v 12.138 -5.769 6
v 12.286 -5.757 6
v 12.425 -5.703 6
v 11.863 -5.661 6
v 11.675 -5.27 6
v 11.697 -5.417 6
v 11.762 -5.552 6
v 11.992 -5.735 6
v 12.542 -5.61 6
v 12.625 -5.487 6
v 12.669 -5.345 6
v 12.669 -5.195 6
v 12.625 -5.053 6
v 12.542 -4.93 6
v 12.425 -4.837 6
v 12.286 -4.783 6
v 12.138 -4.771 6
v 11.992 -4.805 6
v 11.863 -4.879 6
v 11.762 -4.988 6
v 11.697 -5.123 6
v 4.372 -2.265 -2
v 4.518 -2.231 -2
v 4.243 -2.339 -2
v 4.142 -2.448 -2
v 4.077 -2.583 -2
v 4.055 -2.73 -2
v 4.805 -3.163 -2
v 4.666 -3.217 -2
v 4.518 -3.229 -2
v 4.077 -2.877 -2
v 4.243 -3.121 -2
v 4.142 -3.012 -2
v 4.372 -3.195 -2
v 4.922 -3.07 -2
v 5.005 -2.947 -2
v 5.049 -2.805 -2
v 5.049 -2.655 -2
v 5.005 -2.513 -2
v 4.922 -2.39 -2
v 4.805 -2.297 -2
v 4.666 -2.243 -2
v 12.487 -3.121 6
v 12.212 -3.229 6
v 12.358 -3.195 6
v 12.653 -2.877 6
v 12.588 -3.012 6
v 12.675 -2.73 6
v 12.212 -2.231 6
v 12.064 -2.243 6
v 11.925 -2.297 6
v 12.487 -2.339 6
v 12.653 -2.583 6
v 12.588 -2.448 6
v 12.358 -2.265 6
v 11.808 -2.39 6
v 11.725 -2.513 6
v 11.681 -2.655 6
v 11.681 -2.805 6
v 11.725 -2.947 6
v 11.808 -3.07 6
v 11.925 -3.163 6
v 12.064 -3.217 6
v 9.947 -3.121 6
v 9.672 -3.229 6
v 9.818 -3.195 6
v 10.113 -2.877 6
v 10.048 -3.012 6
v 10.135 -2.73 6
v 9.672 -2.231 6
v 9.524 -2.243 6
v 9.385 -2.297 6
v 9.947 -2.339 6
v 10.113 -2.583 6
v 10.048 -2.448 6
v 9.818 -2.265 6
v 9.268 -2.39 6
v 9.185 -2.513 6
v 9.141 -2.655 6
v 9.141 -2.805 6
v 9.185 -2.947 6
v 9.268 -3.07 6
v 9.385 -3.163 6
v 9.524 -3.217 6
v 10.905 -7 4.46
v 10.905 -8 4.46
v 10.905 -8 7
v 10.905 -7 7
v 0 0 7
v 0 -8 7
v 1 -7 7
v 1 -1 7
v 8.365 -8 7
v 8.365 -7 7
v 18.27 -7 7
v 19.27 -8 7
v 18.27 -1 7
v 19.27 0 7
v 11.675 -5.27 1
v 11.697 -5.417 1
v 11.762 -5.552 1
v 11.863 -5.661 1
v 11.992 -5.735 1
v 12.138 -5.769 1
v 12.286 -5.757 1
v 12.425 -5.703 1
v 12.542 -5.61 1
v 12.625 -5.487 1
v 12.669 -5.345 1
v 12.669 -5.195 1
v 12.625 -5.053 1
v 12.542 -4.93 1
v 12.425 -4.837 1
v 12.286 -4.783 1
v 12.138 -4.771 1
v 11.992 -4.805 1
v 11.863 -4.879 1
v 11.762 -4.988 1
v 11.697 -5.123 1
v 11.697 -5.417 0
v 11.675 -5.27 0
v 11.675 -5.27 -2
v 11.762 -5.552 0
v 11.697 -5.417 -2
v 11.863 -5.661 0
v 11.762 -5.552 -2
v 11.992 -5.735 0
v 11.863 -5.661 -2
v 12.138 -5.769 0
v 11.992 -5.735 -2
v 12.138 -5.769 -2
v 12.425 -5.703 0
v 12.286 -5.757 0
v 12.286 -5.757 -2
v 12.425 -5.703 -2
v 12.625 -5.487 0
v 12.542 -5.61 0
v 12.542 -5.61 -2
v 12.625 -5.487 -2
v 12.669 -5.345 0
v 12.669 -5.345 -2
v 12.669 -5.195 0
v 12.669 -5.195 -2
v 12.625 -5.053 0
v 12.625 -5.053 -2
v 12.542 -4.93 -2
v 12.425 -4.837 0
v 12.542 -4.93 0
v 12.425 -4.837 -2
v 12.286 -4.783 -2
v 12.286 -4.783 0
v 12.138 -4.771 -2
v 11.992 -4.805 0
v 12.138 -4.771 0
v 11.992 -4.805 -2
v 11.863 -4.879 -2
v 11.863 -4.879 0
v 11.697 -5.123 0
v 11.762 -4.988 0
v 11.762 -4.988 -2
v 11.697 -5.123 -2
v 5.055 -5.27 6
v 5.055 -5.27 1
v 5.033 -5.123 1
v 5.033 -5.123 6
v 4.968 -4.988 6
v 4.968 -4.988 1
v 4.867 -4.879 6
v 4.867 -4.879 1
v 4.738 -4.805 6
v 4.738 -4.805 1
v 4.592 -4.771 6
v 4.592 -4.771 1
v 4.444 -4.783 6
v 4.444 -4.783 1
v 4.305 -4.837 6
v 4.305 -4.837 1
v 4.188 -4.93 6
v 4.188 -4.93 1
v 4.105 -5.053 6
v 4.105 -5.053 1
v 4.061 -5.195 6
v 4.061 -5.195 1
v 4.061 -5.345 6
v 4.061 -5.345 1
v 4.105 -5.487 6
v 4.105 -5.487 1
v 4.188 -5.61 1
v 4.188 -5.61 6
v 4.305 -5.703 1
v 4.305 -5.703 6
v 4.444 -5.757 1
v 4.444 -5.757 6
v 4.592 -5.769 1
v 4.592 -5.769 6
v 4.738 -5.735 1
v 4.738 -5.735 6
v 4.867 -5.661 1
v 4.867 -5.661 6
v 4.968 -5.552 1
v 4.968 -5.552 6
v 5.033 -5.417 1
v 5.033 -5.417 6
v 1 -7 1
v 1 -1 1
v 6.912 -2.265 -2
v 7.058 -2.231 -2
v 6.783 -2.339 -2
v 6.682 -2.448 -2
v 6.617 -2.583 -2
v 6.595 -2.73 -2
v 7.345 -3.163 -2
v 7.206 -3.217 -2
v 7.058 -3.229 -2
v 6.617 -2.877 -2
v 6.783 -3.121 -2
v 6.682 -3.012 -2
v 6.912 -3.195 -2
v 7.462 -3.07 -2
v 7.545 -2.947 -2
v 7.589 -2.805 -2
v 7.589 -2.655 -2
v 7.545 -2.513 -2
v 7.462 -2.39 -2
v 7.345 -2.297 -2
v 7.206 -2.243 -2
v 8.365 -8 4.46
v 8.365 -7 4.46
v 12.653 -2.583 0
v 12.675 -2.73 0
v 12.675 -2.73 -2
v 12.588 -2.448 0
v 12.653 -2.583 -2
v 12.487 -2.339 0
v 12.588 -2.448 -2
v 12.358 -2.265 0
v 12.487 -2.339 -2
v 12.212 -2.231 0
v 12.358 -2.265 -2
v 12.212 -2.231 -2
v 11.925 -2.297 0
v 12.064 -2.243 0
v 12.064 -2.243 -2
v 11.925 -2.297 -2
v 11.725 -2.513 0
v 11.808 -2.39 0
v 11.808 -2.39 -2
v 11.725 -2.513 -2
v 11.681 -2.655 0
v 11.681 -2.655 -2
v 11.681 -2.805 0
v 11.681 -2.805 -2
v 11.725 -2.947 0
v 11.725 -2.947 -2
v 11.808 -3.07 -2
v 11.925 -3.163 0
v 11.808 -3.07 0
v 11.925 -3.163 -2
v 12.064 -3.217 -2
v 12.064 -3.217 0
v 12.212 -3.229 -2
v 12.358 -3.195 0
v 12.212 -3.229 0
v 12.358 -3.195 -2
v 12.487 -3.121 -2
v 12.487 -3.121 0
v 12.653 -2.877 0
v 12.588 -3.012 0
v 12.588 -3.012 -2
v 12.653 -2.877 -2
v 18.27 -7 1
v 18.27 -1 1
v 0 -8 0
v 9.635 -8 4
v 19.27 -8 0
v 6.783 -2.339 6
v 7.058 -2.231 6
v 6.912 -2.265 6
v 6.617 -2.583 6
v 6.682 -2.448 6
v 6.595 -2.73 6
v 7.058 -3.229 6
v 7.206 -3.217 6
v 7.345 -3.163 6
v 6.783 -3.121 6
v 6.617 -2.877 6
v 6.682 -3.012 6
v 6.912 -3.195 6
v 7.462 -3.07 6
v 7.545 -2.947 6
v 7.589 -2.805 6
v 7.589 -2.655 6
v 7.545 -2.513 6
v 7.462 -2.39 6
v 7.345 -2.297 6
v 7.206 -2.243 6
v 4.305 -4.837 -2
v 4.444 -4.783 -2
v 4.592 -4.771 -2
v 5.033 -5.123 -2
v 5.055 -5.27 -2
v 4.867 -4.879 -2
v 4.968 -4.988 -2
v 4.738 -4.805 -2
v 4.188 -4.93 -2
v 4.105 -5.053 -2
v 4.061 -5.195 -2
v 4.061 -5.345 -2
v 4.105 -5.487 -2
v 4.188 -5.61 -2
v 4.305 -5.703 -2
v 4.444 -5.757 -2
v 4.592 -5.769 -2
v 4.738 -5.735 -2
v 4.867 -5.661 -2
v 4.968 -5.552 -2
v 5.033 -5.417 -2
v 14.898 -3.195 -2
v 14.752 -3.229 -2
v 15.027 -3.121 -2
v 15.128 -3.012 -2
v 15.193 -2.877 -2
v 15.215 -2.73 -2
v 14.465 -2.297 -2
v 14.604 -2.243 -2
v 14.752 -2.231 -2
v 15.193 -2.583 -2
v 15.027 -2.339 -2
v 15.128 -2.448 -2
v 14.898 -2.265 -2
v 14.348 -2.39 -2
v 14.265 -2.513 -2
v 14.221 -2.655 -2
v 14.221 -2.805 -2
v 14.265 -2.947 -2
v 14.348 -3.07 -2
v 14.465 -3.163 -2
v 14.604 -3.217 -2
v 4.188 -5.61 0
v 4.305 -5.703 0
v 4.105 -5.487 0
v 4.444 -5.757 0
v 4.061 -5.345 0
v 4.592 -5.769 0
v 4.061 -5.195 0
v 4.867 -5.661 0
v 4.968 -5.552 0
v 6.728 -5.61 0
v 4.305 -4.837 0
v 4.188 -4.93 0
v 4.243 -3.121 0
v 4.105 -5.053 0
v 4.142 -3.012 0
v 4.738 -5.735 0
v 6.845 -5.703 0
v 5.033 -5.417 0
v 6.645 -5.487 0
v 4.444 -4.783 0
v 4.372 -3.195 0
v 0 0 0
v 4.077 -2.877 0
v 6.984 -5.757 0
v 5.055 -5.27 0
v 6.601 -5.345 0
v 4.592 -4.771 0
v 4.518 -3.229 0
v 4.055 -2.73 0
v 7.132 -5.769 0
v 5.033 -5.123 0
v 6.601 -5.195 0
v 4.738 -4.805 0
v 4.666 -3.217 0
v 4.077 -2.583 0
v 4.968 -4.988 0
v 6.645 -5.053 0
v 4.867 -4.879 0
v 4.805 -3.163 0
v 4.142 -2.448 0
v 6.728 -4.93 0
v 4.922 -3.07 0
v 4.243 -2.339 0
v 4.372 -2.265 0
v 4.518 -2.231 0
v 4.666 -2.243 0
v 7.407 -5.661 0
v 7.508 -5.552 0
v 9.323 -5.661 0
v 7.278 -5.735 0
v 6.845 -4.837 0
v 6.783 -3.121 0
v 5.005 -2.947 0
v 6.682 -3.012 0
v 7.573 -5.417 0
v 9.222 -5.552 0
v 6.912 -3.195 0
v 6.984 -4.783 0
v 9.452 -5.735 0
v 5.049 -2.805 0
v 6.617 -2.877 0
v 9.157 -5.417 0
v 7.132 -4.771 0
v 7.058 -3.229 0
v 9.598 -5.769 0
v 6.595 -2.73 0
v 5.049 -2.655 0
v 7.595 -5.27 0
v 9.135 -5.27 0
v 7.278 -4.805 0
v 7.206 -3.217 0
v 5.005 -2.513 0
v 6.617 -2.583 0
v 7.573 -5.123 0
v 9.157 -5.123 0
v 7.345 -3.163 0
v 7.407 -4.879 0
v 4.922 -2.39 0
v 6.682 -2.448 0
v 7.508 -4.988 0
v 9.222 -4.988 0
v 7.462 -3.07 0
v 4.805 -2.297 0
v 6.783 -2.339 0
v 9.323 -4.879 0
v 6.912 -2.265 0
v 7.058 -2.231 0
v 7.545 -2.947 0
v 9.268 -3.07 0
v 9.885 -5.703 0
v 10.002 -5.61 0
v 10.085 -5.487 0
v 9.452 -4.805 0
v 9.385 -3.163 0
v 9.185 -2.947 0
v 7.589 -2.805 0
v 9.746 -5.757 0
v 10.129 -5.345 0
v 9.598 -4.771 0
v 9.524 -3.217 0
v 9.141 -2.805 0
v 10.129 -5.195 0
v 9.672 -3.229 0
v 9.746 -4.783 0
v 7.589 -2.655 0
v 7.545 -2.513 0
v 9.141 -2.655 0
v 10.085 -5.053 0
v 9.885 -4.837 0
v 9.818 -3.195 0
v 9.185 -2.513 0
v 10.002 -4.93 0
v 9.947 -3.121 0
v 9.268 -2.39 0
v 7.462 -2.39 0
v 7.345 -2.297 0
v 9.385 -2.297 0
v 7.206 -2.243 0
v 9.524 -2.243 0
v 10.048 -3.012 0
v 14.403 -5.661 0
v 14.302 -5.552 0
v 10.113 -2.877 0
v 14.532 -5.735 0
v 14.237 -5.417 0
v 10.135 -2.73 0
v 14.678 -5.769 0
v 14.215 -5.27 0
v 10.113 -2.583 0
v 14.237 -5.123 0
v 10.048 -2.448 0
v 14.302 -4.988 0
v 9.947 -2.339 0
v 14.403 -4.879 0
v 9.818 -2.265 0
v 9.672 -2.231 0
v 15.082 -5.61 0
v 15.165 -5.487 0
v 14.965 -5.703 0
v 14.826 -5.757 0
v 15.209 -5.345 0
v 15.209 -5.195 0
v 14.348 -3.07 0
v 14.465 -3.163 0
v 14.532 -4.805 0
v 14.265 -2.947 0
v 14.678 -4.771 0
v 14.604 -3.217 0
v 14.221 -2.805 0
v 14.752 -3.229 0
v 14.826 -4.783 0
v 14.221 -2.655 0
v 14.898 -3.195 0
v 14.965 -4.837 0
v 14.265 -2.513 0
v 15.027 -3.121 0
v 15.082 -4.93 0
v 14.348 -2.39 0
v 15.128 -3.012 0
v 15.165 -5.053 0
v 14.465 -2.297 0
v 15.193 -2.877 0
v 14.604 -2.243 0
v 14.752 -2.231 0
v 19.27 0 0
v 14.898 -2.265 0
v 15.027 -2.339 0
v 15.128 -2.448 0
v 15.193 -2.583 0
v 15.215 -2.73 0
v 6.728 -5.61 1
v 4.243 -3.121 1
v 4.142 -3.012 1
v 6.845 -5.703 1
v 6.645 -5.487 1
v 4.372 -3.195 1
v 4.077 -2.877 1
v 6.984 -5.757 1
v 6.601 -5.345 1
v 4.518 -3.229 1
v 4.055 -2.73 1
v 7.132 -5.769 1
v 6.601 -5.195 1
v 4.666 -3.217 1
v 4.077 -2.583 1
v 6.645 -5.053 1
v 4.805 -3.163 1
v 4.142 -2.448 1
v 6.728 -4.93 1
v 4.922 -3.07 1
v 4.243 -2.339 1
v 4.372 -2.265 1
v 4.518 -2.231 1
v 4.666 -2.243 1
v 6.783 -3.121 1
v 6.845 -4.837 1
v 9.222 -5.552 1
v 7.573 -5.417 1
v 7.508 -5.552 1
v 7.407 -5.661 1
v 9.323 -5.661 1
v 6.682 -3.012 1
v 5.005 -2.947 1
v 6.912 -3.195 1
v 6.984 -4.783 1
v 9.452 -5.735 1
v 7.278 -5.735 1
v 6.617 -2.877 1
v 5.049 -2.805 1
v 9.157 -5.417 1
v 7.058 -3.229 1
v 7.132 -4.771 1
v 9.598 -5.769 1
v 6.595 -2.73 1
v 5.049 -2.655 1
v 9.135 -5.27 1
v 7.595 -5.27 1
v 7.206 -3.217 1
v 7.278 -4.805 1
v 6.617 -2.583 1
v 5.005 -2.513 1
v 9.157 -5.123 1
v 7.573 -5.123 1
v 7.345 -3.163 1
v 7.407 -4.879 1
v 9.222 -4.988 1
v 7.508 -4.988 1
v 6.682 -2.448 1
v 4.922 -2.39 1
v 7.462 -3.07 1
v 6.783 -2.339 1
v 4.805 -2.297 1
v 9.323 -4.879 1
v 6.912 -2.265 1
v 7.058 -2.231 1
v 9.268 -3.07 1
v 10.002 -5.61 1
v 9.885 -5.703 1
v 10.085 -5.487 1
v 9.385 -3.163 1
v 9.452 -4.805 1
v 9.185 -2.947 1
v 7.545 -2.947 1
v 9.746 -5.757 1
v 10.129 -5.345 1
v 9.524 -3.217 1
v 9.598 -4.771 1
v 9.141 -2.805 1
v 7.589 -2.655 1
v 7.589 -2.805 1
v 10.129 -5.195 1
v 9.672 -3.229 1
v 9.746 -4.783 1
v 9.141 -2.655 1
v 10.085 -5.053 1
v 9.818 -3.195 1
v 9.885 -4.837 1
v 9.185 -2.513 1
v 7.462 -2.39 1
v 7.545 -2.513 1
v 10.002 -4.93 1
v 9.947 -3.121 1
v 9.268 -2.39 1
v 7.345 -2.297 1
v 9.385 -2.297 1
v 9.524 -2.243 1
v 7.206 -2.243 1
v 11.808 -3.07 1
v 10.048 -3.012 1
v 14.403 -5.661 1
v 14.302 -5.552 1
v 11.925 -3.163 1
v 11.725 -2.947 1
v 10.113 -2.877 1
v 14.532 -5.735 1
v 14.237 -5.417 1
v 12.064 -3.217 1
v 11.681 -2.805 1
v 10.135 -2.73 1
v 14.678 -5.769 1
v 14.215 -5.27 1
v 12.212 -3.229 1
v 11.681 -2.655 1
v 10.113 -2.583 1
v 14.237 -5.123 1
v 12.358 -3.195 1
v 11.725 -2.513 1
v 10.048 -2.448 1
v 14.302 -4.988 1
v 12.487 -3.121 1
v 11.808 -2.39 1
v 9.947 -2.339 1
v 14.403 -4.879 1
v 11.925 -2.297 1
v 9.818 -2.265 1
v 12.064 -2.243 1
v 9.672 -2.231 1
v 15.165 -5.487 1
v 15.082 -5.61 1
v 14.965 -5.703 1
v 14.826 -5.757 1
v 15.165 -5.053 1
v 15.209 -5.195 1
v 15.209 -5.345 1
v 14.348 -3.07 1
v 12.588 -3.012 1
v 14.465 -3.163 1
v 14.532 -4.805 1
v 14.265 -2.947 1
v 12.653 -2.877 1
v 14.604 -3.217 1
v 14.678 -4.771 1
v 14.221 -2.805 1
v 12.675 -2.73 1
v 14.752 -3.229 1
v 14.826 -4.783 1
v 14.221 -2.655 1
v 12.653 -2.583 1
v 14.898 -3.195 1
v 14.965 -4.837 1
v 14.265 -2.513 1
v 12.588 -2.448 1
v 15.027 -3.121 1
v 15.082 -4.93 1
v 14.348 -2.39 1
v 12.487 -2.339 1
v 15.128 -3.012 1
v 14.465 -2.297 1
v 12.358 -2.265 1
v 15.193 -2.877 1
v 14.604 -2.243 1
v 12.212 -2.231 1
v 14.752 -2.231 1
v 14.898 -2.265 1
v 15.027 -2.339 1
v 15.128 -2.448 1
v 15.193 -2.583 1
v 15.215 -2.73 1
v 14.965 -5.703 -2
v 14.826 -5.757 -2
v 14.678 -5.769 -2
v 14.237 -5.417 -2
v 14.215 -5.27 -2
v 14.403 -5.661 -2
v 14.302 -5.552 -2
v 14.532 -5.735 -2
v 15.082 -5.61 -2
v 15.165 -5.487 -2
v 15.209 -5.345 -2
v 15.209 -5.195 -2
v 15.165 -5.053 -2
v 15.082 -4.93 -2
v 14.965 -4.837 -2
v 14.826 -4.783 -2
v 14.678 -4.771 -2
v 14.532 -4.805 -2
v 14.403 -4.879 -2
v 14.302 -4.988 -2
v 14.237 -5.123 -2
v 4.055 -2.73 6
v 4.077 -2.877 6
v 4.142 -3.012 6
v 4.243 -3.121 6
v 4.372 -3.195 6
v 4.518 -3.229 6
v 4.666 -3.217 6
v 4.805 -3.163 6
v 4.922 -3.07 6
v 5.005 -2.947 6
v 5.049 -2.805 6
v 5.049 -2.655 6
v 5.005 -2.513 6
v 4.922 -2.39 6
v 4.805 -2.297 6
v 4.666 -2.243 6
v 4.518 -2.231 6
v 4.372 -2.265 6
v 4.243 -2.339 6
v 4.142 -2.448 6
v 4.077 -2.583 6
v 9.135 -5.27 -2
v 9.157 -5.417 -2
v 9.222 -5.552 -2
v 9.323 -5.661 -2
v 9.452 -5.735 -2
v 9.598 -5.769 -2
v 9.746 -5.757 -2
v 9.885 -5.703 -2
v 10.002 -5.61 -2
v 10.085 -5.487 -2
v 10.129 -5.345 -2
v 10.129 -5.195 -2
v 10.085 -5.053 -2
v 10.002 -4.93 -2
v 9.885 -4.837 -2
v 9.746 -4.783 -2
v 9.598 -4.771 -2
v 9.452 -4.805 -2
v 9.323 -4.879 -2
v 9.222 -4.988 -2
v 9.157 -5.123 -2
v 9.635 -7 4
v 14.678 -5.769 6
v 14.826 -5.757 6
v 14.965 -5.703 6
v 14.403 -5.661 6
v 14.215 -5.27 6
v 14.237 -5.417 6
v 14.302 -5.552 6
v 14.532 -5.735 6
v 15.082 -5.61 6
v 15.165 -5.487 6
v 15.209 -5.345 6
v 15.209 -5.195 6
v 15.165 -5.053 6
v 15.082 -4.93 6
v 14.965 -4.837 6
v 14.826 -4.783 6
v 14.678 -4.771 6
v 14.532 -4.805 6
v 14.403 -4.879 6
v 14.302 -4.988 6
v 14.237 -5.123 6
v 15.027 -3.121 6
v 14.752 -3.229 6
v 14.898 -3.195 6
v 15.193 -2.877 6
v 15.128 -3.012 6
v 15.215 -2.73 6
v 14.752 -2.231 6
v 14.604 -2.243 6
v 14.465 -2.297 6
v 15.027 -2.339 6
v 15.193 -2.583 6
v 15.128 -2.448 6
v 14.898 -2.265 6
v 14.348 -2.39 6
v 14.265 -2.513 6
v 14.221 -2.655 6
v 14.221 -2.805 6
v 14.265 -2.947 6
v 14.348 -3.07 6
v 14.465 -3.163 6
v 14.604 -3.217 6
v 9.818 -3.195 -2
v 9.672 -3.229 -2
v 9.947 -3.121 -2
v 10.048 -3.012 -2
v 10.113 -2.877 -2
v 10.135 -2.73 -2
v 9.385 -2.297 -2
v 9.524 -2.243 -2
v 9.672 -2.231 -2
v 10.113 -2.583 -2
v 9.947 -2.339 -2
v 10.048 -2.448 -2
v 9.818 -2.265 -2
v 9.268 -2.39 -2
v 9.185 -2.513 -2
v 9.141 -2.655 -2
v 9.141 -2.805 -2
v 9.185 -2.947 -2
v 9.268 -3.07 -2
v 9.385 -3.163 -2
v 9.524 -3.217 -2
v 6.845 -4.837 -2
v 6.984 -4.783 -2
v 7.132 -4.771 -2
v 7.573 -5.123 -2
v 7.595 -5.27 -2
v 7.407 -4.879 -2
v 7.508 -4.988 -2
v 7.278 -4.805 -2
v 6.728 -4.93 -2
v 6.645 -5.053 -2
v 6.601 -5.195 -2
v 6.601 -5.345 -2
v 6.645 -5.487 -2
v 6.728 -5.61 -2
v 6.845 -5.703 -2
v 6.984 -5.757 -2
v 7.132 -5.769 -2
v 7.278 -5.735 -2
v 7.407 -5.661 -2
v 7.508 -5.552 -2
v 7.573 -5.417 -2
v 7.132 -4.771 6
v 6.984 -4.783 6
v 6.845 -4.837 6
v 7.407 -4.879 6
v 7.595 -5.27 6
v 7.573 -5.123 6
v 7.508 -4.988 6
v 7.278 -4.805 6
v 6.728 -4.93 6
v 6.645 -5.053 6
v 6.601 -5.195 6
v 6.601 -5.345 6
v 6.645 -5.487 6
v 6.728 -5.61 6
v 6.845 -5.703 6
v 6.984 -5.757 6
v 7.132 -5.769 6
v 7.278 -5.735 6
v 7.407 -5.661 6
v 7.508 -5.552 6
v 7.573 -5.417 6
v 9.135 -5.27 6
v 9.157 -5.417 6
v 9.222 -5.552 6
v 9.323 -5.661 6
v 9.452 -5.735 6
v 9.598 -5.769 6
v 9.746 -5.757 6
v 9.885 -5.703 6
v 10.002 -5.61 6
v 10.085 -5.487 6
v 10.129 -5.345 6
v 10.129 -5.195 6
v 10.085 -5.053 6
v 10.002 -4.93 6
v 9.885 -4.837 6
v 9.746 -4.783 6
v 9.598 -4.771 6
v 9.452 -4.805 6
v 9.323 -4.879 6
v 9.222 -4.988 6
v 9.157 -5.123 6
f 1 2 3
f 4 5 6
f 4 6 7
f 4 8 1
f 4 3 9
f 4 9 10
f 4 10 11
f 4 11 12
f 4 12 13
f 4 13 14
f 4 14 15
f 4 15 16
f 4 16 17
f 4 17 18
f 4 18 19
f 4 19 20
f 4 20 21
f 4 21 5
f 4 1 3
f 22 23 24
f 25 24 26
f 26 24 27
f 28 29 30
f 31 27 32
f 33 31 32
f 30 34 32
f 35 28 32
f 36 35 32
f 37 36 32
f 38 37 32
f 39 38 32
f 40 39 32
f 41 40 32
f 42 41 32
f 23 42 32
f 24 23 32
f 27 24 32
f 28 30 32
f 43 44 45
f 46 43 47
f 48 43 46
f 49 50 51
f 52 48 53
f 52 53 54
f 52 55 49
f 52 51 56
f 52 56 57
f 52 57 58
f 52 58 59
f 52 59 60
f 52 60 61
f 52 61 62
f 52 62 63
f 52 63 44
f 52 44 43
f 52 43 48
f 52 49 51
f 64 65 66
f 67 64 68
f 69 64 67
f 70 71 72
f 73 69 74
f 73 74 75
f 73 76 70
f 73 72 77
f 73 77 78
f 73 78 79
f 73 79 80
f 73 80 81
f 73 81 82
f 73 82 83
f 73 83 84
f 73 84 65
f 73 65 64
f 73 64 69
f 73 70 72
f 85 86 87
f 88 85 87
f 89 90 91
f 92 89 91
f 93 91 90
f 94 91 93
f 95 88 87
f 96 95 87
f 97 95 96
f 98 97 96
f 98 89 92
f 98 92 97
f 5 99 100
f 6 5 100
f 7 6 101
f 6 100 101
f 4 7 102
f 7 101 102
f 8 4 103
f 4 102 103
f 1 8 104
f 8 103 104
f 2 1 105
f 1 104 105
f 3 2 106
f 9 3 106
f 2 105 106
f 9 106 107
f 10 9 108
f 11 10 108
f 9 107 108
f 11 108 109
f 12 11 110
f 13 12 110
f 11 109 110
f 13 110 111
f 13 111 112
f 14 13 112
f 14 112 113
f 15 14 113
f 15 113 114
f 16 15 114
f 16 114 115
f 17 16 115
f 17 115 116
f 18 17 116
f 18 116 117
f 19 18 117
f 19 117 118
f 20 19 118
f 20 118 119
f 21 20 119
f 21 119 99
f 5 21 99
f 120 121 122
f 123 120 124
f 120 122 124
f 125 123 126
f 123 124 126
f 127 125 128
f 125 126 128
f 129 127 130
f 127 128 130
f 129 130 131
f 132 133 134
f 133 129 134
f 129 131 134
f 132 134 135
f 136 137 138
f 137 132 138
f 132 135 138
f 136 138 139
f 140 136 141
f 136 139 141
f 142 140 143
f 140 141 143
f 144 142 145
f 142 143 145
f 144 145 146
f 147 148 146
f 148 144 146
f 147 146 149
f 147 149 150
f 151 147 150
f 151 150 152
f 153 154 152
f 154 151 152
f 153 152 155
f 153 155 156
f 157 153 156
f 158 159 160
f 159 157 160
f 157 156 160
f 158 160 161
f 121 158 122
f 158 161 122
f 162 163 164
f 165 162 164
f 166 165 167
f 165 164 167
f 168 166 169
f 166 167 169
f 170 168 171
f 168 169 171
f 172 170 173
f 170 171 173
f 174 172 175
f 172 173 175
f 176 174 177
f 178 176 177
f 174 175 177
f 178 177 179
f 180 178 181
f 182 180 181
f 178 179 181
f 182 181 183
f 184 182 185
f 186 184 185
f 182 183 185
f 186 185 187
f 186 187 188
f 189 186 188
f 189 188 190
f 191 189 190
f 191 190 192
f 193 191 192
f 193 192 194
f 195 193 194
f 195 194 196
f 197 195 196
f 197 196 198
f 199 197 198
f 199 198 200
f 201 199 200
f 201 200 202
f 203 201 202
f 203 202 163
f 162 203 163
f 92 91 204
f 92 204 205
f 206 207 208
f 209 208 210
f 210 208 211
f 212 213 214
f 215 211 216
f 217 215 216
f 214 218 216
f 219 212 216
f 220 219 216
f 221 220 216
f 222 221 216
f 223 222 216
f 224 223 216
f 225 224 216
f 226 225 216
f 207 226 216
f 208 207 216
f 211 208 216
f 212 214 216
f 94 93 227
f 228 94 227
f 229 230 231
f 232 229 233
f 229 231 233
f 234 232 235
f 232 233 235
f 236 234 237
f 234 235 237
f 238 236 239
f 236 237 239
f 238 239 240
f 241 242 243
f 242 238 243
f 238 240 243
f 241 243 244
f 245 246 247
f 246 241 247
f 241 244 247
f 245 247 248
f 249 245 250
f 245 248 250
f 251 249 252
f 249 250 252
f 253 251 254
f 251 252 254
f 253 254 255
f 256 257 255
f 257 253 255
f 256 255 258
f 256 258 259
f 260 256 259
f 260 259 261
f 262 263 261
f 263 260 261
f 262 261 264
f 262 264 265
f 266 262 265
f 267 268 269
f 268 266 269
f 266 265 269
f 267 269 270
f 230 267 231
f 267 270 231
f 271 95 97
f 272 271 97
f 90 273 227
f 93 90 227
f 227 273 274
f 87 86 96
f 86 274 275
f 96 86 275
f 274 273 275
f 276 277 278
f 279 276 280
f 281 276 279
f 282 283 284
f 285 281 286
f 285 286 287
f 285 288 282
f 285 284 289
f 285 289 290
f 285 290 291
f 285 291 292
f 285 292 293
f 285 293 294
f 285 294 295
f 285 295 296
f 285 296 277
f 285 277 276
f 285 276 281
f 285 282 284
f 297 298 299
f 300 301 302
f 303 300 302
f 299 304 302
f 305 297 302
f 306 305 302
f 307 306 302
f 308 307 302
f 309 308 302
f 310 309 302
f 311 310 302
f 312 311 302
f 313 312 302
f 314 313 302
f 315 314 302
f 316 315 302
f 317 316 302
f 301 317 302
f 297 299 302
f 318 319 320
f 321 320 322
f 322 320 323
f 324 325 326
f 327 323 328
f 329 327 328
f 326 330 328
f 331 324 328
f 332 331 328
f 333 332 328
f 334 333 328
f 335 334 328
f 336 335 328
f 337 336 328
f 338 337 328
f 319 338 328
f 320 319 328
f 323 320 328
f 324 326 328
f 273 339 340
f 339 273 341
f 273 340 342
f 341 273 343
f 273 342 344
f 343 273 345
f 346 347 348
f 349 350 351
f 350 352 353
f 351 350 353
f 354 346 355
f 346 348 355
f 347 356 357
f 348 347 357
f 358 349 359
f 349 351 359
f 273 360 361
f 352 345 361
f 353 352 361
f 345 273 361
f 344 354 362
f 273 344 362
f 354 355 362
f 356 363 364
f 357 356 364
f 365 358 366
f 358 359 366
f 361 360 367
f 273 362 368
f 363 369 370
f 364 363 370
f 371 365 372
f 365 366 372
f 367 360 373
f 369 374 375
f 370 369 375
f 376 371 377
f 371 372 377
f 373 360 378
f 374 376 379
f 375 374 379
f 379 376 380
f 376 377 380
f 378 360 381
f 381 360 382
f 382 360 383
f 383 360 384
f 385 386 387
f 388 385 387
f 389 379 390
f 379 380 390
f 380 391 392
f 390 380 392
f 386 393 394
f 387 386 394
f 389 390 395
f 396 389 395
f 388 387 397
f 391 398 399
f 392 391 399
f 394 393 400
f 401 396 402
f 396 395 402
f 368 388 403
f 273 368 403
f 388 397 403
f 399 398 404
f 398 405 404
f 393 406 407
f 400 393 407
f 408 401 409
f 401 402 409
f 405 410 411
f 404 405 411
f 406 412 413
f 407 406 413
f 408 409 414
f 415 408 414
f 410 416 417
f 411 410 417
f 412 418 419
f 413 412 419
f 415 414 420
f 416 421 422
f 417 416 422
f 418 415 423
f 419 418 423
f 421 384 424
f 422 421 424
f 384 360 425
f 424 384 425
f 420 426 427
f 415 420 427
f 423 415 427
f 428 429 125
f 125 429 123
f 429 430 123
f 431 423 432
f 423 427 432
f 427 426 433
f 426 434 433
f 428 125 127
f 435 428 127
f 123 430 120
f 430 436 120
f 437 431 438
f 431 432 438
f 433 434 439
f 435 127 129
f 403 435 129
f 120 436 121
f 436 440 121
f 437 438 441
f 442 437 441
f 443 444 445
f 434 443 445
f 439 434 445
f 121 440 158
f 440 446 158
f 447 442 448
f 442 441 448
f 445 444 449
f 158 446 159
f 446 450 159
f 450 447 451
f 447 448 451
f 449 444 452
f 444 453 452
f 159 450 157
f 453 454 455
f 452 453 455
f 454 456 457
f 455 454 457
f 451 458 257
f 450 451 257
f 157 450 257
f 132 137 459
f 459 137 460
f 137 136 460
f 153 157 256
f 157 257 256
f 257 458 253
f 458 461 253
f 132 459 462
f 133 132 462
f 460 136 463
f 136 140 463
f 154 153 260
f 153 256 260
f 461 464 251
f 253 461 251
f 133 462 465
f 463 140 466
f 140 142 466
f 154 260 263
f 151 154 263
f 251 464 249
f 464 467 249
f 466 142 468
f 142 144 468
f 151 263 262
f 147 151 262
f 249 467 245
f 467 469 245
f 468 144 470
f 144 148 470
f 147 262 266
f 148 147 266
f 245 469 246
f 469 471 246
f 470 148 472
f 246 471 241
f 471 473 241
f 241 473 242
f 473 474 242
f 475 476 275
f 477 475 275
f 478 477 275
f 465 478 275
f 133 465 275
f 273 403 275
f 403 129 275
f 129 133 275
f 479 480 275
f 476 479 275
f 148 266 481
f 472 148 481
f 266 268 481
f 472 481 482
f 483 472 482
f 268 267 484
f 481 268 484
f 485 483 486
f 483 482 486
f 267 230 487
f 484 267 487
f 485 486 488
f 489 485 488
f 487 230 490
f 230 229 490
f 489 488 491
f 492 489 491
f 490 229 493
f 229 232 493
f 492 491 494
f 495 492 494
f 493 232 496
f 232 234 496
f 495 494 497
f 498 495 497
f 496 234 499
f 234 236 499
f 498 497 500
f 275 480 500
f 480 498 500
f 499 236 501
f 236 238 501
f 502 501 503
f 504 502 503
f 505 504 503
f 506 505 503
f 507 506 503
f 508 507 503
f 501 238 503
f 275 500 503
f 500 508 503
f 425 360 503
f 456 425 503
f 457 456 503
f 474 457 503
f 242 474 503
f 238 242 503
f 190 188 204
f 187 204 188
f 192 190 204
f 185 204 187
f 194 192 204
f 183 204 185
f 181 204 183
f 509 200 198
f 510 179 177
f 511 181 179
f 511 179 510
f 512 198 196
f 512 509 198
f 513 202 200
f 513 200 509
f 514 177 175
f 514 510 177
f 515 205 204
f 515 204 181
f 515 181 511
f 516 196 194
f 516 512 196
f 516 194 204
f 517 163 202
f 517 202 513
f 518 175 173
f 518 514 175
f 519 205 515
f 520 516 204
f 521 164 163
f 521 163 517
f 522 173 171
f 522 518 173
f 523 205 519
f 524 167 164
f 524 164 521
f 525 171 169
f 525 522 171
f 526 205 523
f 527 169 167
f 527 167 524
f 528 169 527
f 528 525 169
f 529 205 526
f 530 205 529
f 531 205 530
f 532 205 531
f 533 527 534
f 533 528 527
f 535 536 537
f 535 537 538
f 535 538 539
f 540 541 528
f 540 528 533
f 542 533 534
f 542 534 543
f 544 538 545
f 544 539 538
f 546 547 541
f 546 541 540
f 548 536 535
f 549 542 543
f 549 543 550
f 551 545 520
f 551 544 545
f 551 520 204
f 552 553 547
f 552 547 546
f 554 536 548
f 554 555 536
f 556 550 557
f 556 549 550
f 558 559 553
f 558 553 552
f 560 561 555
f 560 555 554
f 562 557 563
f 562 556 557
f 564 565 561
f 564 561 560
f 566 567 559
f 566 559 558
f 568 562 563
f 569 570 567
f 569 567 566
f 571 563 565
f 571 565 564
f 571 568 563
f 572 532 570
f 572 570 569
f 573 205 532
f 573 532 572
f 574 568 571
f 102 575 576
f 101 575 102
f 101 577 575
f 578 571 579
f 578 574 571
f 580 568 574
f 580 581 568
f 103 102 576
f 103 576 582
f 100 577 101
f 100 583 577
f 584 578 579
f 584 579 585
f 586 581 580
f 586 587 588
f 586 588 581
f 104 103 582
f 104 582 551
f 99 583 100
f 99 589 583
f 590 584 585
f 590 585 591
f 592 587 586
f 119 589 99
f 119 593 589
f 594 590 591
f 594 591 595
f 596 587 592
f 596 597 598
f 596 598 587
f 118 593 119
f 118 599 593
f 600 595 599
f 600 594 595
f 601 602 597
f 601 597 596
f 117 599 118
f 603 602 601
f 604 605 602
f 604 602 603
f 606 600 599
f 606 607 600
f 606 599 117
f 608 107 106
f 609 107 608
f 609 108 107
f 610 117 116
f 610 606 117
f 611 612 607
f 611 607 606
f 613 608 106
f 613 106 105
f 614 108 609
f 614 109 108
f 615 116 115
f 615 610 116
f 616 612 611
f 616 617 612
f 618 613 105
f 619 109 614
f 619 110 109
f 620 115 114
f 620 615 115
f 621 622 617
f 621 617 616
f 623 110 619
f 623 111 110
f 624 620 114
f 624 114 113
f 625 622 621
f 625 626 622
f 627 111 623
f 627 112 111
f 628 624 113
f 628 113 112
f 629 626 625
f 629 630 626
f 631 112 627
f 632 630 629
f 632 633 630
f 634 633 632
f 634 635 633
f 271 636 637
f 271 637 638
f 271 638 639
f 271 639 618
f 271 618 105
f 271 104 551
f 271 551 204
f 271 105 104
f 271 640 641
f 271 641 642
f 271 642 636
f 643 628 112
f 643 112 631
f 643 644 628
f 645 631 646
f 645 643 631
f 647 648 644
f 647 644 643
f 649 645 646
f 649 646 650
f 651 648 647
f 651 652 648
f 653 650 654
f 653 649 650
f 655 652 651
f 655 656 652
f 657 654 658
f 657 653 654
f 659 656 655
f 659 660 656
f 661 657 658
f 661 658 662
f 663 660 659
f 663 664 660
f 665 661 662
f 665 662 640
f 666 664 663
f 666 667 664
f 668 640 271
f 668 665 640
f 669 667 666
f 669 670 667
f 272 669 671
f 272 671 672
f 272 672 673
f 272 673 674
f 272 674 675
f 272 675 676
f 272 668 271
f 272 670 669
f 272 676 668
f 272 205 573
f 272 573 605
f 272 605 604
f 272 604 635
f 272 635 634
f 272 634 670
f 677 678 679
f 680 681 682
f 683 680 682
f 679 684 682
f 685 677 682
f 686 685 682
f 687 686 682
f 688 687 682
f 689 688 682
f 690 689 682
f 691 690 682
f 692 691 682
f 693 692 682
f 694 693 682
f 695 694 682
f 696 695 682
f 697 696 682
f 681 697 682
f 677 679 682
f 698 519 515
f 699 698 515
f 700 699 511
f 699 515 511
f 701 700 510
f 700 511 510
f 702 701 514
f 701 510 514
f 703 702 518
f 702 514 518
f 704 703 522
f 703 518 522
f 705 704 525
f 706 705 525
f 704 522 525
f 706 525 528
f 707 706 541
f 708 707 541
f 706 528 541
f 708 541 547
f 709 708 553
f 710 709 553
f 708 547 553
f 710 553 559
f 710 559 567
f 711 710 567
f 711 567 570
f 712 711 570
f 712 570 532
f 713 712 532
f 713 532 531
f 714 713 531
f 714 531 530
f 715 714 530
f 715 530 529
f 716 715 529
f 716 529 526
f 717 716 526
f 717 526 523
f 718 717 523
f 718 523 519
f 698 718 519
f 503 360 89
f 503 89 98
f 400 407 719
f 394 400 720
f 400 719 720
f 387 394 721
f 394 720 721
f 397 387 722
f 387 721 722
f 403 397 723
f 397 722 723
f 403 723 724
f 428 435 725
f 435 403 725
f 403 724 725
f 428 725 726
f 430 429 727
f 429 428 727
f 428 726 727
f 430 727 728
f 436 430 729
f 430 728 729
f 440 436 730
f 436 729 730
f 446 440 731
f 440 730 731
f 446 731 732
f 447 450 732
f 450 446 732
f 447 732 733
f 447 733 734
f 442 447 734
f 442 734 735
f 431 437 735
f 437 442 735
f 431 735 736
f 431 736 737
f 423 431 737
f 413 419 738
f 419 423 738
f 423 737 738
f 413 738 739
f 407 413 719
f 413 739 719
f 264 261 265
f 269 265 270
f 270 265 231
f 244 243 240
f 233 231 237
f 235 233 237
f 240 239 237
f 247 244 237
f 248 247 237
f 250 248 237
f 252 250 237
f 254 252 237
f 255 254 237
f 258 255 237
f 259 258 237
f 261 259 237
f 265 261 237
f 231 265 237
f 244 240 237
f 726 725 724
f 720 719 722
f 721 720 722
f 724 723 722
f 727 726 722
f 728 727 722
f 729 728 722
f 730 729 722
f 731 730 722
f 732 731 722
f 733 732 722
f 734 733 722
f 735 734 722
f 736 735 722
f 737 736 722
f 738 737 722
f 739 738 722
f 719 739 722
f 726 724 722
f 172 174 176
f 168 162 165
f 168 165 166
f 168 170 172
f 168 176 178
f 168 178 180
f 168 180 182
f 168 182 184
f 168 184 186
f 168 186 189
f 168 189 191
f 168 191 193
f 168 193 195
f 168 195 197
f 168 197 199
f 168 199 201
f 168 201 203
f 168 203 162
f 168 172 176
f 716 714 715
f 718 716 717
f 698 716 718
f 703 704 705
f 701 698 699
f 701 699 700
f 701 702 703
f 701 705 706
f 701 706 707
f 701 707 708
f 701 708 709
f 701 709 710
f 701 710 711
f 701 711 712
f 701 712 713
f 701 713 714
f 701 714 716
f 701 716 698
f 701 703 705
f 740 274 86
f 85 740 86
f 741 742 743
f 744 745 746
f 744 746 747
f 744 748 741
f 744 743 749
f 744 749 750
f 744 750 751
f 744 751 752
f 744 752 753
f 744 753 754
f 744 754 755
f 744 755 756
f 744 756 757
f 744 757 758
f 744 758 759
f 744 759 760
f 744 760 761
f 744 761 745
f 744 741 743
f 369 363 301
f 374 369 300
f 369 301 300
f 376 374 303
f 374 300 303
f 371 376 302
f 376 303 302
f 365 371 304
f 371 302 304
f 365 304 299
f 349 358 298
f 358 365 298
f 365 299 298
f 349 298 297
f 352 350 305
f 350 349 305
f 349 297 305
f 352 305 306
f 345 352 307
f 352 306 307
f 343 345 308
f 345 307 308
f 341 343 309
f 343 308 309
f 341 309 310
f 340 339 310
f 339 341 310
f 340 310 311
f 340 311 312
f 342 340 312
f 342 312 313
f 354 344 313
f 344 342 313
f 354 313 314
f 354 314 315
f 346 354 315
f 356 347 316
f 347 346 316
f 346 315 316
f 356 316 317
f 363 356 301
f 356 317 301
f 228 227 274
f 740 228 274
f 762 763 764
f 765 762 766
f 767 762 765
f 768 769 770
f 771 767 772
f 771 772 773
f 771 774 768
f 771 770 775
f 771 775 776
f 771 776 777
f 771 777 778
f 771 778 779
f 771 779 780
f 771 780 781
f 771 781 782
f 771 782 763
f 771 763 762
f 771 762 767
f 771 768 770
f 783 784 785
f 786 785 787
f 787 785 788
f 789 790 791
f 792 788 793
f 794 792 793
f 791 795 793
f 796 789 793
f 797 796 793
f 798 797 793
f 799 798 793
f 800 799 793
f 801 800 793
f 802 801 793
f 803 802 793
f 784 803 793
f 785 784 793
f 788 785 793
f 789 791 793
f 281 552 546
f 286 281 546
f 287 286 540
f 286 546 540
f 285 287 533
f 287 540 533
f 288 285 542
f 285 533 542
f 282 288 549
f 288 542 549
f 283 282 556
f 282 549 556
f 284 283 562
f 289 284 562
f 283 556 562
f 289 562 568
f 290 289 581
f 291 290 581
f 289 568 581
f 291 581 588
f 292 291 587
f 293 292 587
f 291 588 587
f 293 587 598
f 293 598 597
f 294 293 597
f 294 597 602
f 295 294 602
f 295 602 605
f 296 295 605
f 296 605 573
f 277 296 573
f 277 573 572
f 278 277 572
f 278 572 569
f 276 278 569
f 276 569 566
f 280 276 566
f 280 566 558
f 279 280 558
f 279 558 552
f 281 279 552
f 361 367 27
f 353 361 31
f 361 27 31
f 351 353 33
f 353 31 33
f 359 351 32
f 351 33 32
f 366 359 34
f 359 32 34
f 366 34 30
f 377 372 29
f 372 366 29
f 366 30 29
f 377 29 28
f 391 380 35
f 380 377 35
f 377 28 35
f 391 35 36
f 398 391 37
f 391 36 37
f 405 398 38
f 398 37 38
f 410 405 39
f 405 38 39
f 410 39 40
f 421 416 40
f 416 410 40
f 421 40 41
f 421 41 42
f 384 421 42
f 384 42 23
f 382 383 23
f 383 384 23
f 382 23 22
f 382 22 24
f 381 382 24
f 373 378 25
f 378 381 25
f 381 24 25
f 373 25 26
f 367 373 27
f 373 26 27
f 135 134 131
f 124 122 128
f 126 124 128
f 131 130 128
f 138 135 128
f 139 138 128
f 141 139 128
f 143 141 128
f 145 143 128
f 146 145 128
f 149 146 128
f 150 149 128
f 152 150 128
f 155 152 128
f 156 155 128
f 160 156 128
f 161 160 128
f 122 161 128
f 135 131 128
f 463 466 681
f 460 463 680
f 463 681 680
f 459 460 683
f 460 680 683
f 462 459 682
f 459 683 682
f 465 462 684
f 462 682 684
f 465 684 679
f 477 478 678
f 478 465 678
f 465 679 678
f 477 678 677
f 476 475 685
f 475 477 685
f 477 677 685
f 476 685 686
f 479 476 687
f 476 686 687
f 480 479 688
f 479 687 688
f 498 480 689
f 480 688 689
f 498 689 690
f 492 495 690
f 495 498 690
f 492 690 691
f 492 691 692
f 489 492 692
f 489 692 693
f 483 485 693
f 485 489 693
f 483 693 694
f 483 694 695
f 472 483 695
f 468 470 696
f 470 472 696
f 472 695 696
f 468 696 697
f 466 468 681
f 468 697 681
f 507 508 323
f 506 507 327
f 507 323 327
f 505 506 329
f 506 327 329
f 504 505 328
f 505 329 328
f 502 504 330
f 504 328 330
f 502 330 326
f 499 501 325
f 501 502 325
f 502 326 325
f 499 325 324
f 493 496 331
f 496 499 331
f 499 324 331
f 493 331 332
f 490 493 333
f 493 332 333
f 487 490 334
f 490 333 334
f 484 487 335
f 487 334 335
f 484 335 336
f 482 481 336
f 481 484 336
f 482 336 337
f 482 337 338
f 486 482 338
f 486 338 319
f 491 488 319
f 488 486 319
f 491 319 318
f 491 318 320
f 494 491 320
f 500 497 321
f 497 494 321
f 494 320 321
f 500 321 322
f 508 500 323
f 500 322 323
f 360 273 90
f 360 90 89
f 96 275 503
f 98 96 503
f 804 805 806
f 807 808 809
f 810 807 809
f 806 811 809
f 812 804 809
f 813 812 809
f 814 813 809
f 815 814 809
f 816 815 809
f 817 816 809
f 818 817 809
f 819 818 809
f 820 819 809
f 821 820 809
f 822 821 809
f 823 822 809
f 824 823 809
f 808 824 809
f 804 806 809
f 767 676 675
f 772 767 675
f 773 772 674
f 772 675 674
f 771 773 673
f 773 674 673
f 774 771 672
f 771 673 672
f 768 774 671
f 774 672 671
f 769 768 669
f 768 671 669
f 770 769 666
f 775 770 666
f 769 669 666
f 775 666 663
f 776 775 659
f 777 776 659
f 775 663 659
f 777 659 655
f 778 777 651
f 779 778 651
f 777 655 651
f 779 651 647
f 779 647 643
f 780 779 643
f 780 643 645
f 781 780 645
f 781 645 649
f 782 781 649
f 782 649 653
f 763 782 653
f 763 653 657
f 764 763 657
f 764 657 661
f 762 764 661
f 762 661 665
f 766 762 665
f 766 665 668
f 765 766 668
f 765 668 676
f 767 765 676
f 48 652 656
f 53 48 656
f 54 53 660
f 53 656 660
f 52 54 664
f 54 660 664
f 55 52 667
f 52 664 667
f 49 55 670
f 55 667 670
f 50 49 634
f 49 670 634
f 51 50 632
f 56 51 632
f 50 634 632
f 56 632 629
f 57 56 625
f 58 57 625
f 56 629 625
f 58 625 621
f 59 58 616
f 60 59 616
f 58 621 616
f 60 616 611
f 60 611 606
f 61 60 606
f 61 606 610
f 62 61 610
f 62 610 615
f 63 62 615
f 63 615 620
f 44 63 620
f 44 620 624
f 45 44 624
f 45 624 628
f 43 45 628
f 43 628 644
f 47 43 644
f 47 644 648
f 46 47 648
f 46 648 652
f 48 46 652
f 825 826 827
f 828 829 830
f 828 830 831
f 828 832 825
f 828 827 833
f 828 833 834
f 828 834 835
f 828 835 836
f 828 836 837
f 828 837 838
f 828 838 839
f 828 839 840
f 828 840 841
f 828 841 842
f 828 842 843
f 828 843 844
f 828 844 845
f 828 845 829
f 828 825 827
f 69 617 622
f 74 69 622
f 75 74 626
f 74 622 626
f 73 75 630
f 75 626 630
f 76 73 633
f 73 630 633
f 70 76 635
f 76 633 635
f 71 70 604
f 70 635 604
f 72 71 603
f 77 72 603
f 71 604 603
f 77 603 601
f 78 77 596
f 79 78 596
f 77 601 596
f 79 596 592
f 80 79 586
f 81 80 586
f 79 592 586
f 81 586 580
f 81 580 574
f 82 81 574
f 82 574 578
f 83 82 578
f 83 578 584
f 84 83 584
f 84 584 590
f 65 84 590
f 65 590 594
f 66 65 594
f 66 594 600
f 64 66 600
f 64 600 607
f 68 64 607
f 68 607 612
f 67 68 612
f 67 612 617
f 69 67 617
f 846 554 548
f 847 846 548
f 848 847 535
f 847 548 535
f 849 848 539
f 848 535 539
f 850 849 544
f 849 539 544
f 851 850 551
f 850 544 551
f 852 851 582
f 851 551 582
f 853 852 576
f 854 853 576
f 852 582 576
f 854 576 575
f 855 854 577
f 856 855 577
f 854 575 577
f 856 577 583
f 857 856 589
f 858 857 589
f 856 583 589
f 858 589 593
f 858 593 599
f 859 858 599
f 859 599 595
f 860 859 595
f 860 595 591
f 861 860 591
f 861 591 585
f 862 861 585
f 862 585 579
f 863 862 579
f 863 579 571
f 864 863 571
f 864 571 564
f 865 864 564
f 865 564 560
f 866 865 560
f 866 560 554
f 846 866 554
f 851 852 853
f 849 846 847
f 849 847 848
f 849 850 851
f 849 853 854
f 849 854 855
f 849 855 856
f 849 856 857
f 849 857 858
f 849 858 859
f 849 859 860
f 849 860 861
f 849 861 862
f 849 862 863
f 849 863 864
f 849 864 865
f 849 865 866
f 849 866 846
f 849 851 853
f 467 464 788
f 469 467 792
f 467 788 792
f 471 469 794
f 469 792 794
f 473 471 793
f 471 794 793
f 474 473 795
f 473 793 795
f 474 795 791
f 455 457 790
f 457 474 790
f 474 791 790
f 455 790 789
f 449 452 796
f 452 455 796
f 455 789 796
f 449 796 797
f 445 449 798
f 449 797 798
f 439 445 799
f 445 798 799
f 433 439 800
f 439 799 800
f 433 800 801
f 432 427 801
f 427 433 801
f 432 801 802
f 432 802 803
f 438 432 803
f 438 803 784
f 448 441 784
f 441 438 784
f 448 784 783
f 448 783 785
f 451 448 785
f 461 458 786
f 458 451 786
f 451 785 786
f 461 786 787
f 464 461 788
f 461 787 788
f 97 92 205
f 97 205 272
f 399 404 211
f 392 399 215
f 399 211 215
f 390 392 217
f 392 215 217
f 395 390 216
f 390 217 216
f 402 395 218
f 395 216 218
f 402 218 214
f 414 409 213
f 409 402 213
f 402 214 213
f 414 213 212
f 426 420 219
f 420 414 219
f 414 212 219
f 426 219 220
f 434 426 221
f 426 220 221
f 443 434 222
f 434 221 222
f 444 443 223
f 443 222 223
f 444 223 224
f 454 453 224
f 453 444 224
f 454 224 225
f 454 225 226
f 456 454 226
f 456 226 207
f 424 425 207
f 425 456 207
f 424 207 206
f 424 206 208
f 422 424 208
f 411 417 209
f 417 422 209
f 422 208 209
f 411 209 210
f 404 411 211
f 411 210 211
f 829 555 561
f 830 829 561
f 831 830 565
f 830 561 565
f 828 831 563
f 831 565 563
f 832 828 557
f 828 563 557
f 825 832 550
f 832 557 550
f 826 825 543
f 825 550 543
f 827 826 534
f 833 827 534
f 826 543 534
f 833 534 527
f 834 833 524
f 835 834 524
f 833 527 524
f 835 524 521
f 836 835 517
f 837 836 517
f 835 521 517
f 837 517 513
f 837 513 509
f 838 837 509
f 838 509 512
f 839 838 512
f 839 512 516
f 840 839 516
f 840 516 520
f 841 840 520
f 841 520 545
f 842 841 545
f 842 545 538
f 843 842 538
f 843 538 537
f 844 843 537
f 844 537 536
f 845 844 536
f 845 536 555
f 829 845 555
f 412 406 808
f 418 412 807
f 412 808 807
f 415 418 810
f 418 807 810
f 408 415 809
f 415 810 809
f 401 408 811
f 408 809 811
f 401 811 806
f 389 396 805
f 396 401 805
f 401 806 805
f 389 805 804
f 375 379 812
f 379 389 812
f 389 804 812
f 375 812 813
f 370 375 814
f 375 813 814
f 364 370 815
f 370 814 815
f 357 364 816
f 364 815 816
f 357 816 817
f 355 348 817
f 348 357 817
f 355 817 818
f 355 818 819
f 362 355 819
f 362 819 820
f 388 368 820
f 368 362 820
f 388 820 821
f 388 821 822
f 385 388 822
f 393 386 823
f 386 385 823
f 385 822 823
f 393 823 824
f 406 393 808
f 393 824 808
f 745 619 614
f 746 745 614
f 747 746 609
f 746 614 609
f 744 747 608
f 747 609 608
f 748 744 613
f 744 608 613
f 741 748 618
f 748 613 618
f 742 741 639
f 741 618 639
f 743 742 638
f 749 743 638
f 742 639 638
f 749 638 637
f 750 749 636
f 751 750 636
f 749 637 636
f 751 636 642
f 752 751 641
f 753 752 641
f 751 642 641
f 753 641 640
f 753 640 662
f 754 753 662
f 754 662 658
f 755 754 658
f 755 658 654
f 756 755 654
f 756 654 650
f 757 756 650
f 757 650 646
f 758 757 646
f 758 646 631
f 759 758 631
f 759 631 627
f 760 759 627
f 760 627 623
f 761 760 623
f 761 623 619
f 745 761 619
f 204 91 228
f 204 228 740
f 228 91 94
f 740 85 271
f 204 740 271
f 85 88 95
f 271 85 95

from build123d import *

# Parameters (mm, degrees)
SKETCH_1_W           = 19.27
SKETCH_1_H           = 8
EXTRUDE_1_DEPTH      = 7
SKETCH_2_W           = 17.27
SKETCH_2_H           = 6
CUT_EXTRUDE_1_DEPTH  = 6
CUT_EXTRUDE_2_REACH  = 24.008
EXTRUDE_2_DEPTH      = 5
EXTRUDE_2_DEPTH_BACK = 3
SKETCH_4_R           = 0.5


with BuildPart() as part:
    # 草图1 → 凸台-拉伸1 (new body)
    with BuildSketch(Plane.XY):
        with Locations((9.635, -4)):
            Rectangle(SKETCH_1_W, SKETCH_1_H)
    extrude(amount=EXTRUDE_1_DEPTH)

    # 草图2 → 切除-拉伸1 (cut)
    with BuildSketch(Plane.XY.offset(7)):
        with Locations((9.635, -4)):
            Rectangle(SKETCH_2_W, SKETCH_2_H)
    extrude(amount=-CUT_EXTRUDE_1_DEPTH, mode=Mode.SUBTRACT)

    # 草图3 → 切除-拉伸2 (cut, up to next)
    with BuildSketch(Plane.XZ.offset(8), mode=Mode.PRIVATE) as cut_extrude_2_sk1:
        Polygon((8.365, 7), (8.365, 4.46), (9.635, 4), (10.905, 4.46), (10.905, 7), align=None)
    cut_extrude_2_tool1 = extrude(cut_extrude_2_sk1.sketch, amount=-CUT_EXTRUDE_2_REACH, mode=Mode.PRIVATE) & part.part
    add(cut_extrude_2_tool1.solids().sort_by_distance((9.635, -8, 5.611817))[0], mode=Mode.SUBTRACT)

    # 草图4 → 凸台-拉伸2 (add, two sides: drawn at the far end of the back side and taken through both)
    with BuildSketch(Plane.XY.offset(1).offset(-EXTRUDE_2_DEPTH_BACK)):
        with Locations((9.635, -2.73)):
            Circle(SKETCH_4_R)
        with Locations((12.175, -2.73)):
            Circle(SKETCH_4_R)
        with Locations((14.715, -2.73)):
            Circle(SKETCH_4_R)
        with Locations(Location((4.555, -2.73, 0), (0, 0, 180))):
            Circle(SKETCH_4_R)
        with Locations(Location((7.095, -2.73, 0), (0, 0, 180))):
            Circle(SKETCH_4_R)
        with Locations(Location((14.715, -5.27, 0), (0, 0, 180))):
            Circle(SKETCH_4_R)
        with Locations(Location((12.175, -5.27, 0), (0, 0, 180))):
            Circle(SKETCH_4_R)
        with Locations(Location((9.635, -5.27, 0), (0, 0, 180))):
            Circle(SKETCH_4_R)
        with Locations((7.095, -5.27)):
            Circle(SKETCH_4_R)
        with Locations((4.555, -5.27)):
            Circle(SKETCH_4_R)
    extrude(amount=EXTRUDE_2_DEPTH + EXTRUDE_2_DEPTH_BACK)


solid = part.part
